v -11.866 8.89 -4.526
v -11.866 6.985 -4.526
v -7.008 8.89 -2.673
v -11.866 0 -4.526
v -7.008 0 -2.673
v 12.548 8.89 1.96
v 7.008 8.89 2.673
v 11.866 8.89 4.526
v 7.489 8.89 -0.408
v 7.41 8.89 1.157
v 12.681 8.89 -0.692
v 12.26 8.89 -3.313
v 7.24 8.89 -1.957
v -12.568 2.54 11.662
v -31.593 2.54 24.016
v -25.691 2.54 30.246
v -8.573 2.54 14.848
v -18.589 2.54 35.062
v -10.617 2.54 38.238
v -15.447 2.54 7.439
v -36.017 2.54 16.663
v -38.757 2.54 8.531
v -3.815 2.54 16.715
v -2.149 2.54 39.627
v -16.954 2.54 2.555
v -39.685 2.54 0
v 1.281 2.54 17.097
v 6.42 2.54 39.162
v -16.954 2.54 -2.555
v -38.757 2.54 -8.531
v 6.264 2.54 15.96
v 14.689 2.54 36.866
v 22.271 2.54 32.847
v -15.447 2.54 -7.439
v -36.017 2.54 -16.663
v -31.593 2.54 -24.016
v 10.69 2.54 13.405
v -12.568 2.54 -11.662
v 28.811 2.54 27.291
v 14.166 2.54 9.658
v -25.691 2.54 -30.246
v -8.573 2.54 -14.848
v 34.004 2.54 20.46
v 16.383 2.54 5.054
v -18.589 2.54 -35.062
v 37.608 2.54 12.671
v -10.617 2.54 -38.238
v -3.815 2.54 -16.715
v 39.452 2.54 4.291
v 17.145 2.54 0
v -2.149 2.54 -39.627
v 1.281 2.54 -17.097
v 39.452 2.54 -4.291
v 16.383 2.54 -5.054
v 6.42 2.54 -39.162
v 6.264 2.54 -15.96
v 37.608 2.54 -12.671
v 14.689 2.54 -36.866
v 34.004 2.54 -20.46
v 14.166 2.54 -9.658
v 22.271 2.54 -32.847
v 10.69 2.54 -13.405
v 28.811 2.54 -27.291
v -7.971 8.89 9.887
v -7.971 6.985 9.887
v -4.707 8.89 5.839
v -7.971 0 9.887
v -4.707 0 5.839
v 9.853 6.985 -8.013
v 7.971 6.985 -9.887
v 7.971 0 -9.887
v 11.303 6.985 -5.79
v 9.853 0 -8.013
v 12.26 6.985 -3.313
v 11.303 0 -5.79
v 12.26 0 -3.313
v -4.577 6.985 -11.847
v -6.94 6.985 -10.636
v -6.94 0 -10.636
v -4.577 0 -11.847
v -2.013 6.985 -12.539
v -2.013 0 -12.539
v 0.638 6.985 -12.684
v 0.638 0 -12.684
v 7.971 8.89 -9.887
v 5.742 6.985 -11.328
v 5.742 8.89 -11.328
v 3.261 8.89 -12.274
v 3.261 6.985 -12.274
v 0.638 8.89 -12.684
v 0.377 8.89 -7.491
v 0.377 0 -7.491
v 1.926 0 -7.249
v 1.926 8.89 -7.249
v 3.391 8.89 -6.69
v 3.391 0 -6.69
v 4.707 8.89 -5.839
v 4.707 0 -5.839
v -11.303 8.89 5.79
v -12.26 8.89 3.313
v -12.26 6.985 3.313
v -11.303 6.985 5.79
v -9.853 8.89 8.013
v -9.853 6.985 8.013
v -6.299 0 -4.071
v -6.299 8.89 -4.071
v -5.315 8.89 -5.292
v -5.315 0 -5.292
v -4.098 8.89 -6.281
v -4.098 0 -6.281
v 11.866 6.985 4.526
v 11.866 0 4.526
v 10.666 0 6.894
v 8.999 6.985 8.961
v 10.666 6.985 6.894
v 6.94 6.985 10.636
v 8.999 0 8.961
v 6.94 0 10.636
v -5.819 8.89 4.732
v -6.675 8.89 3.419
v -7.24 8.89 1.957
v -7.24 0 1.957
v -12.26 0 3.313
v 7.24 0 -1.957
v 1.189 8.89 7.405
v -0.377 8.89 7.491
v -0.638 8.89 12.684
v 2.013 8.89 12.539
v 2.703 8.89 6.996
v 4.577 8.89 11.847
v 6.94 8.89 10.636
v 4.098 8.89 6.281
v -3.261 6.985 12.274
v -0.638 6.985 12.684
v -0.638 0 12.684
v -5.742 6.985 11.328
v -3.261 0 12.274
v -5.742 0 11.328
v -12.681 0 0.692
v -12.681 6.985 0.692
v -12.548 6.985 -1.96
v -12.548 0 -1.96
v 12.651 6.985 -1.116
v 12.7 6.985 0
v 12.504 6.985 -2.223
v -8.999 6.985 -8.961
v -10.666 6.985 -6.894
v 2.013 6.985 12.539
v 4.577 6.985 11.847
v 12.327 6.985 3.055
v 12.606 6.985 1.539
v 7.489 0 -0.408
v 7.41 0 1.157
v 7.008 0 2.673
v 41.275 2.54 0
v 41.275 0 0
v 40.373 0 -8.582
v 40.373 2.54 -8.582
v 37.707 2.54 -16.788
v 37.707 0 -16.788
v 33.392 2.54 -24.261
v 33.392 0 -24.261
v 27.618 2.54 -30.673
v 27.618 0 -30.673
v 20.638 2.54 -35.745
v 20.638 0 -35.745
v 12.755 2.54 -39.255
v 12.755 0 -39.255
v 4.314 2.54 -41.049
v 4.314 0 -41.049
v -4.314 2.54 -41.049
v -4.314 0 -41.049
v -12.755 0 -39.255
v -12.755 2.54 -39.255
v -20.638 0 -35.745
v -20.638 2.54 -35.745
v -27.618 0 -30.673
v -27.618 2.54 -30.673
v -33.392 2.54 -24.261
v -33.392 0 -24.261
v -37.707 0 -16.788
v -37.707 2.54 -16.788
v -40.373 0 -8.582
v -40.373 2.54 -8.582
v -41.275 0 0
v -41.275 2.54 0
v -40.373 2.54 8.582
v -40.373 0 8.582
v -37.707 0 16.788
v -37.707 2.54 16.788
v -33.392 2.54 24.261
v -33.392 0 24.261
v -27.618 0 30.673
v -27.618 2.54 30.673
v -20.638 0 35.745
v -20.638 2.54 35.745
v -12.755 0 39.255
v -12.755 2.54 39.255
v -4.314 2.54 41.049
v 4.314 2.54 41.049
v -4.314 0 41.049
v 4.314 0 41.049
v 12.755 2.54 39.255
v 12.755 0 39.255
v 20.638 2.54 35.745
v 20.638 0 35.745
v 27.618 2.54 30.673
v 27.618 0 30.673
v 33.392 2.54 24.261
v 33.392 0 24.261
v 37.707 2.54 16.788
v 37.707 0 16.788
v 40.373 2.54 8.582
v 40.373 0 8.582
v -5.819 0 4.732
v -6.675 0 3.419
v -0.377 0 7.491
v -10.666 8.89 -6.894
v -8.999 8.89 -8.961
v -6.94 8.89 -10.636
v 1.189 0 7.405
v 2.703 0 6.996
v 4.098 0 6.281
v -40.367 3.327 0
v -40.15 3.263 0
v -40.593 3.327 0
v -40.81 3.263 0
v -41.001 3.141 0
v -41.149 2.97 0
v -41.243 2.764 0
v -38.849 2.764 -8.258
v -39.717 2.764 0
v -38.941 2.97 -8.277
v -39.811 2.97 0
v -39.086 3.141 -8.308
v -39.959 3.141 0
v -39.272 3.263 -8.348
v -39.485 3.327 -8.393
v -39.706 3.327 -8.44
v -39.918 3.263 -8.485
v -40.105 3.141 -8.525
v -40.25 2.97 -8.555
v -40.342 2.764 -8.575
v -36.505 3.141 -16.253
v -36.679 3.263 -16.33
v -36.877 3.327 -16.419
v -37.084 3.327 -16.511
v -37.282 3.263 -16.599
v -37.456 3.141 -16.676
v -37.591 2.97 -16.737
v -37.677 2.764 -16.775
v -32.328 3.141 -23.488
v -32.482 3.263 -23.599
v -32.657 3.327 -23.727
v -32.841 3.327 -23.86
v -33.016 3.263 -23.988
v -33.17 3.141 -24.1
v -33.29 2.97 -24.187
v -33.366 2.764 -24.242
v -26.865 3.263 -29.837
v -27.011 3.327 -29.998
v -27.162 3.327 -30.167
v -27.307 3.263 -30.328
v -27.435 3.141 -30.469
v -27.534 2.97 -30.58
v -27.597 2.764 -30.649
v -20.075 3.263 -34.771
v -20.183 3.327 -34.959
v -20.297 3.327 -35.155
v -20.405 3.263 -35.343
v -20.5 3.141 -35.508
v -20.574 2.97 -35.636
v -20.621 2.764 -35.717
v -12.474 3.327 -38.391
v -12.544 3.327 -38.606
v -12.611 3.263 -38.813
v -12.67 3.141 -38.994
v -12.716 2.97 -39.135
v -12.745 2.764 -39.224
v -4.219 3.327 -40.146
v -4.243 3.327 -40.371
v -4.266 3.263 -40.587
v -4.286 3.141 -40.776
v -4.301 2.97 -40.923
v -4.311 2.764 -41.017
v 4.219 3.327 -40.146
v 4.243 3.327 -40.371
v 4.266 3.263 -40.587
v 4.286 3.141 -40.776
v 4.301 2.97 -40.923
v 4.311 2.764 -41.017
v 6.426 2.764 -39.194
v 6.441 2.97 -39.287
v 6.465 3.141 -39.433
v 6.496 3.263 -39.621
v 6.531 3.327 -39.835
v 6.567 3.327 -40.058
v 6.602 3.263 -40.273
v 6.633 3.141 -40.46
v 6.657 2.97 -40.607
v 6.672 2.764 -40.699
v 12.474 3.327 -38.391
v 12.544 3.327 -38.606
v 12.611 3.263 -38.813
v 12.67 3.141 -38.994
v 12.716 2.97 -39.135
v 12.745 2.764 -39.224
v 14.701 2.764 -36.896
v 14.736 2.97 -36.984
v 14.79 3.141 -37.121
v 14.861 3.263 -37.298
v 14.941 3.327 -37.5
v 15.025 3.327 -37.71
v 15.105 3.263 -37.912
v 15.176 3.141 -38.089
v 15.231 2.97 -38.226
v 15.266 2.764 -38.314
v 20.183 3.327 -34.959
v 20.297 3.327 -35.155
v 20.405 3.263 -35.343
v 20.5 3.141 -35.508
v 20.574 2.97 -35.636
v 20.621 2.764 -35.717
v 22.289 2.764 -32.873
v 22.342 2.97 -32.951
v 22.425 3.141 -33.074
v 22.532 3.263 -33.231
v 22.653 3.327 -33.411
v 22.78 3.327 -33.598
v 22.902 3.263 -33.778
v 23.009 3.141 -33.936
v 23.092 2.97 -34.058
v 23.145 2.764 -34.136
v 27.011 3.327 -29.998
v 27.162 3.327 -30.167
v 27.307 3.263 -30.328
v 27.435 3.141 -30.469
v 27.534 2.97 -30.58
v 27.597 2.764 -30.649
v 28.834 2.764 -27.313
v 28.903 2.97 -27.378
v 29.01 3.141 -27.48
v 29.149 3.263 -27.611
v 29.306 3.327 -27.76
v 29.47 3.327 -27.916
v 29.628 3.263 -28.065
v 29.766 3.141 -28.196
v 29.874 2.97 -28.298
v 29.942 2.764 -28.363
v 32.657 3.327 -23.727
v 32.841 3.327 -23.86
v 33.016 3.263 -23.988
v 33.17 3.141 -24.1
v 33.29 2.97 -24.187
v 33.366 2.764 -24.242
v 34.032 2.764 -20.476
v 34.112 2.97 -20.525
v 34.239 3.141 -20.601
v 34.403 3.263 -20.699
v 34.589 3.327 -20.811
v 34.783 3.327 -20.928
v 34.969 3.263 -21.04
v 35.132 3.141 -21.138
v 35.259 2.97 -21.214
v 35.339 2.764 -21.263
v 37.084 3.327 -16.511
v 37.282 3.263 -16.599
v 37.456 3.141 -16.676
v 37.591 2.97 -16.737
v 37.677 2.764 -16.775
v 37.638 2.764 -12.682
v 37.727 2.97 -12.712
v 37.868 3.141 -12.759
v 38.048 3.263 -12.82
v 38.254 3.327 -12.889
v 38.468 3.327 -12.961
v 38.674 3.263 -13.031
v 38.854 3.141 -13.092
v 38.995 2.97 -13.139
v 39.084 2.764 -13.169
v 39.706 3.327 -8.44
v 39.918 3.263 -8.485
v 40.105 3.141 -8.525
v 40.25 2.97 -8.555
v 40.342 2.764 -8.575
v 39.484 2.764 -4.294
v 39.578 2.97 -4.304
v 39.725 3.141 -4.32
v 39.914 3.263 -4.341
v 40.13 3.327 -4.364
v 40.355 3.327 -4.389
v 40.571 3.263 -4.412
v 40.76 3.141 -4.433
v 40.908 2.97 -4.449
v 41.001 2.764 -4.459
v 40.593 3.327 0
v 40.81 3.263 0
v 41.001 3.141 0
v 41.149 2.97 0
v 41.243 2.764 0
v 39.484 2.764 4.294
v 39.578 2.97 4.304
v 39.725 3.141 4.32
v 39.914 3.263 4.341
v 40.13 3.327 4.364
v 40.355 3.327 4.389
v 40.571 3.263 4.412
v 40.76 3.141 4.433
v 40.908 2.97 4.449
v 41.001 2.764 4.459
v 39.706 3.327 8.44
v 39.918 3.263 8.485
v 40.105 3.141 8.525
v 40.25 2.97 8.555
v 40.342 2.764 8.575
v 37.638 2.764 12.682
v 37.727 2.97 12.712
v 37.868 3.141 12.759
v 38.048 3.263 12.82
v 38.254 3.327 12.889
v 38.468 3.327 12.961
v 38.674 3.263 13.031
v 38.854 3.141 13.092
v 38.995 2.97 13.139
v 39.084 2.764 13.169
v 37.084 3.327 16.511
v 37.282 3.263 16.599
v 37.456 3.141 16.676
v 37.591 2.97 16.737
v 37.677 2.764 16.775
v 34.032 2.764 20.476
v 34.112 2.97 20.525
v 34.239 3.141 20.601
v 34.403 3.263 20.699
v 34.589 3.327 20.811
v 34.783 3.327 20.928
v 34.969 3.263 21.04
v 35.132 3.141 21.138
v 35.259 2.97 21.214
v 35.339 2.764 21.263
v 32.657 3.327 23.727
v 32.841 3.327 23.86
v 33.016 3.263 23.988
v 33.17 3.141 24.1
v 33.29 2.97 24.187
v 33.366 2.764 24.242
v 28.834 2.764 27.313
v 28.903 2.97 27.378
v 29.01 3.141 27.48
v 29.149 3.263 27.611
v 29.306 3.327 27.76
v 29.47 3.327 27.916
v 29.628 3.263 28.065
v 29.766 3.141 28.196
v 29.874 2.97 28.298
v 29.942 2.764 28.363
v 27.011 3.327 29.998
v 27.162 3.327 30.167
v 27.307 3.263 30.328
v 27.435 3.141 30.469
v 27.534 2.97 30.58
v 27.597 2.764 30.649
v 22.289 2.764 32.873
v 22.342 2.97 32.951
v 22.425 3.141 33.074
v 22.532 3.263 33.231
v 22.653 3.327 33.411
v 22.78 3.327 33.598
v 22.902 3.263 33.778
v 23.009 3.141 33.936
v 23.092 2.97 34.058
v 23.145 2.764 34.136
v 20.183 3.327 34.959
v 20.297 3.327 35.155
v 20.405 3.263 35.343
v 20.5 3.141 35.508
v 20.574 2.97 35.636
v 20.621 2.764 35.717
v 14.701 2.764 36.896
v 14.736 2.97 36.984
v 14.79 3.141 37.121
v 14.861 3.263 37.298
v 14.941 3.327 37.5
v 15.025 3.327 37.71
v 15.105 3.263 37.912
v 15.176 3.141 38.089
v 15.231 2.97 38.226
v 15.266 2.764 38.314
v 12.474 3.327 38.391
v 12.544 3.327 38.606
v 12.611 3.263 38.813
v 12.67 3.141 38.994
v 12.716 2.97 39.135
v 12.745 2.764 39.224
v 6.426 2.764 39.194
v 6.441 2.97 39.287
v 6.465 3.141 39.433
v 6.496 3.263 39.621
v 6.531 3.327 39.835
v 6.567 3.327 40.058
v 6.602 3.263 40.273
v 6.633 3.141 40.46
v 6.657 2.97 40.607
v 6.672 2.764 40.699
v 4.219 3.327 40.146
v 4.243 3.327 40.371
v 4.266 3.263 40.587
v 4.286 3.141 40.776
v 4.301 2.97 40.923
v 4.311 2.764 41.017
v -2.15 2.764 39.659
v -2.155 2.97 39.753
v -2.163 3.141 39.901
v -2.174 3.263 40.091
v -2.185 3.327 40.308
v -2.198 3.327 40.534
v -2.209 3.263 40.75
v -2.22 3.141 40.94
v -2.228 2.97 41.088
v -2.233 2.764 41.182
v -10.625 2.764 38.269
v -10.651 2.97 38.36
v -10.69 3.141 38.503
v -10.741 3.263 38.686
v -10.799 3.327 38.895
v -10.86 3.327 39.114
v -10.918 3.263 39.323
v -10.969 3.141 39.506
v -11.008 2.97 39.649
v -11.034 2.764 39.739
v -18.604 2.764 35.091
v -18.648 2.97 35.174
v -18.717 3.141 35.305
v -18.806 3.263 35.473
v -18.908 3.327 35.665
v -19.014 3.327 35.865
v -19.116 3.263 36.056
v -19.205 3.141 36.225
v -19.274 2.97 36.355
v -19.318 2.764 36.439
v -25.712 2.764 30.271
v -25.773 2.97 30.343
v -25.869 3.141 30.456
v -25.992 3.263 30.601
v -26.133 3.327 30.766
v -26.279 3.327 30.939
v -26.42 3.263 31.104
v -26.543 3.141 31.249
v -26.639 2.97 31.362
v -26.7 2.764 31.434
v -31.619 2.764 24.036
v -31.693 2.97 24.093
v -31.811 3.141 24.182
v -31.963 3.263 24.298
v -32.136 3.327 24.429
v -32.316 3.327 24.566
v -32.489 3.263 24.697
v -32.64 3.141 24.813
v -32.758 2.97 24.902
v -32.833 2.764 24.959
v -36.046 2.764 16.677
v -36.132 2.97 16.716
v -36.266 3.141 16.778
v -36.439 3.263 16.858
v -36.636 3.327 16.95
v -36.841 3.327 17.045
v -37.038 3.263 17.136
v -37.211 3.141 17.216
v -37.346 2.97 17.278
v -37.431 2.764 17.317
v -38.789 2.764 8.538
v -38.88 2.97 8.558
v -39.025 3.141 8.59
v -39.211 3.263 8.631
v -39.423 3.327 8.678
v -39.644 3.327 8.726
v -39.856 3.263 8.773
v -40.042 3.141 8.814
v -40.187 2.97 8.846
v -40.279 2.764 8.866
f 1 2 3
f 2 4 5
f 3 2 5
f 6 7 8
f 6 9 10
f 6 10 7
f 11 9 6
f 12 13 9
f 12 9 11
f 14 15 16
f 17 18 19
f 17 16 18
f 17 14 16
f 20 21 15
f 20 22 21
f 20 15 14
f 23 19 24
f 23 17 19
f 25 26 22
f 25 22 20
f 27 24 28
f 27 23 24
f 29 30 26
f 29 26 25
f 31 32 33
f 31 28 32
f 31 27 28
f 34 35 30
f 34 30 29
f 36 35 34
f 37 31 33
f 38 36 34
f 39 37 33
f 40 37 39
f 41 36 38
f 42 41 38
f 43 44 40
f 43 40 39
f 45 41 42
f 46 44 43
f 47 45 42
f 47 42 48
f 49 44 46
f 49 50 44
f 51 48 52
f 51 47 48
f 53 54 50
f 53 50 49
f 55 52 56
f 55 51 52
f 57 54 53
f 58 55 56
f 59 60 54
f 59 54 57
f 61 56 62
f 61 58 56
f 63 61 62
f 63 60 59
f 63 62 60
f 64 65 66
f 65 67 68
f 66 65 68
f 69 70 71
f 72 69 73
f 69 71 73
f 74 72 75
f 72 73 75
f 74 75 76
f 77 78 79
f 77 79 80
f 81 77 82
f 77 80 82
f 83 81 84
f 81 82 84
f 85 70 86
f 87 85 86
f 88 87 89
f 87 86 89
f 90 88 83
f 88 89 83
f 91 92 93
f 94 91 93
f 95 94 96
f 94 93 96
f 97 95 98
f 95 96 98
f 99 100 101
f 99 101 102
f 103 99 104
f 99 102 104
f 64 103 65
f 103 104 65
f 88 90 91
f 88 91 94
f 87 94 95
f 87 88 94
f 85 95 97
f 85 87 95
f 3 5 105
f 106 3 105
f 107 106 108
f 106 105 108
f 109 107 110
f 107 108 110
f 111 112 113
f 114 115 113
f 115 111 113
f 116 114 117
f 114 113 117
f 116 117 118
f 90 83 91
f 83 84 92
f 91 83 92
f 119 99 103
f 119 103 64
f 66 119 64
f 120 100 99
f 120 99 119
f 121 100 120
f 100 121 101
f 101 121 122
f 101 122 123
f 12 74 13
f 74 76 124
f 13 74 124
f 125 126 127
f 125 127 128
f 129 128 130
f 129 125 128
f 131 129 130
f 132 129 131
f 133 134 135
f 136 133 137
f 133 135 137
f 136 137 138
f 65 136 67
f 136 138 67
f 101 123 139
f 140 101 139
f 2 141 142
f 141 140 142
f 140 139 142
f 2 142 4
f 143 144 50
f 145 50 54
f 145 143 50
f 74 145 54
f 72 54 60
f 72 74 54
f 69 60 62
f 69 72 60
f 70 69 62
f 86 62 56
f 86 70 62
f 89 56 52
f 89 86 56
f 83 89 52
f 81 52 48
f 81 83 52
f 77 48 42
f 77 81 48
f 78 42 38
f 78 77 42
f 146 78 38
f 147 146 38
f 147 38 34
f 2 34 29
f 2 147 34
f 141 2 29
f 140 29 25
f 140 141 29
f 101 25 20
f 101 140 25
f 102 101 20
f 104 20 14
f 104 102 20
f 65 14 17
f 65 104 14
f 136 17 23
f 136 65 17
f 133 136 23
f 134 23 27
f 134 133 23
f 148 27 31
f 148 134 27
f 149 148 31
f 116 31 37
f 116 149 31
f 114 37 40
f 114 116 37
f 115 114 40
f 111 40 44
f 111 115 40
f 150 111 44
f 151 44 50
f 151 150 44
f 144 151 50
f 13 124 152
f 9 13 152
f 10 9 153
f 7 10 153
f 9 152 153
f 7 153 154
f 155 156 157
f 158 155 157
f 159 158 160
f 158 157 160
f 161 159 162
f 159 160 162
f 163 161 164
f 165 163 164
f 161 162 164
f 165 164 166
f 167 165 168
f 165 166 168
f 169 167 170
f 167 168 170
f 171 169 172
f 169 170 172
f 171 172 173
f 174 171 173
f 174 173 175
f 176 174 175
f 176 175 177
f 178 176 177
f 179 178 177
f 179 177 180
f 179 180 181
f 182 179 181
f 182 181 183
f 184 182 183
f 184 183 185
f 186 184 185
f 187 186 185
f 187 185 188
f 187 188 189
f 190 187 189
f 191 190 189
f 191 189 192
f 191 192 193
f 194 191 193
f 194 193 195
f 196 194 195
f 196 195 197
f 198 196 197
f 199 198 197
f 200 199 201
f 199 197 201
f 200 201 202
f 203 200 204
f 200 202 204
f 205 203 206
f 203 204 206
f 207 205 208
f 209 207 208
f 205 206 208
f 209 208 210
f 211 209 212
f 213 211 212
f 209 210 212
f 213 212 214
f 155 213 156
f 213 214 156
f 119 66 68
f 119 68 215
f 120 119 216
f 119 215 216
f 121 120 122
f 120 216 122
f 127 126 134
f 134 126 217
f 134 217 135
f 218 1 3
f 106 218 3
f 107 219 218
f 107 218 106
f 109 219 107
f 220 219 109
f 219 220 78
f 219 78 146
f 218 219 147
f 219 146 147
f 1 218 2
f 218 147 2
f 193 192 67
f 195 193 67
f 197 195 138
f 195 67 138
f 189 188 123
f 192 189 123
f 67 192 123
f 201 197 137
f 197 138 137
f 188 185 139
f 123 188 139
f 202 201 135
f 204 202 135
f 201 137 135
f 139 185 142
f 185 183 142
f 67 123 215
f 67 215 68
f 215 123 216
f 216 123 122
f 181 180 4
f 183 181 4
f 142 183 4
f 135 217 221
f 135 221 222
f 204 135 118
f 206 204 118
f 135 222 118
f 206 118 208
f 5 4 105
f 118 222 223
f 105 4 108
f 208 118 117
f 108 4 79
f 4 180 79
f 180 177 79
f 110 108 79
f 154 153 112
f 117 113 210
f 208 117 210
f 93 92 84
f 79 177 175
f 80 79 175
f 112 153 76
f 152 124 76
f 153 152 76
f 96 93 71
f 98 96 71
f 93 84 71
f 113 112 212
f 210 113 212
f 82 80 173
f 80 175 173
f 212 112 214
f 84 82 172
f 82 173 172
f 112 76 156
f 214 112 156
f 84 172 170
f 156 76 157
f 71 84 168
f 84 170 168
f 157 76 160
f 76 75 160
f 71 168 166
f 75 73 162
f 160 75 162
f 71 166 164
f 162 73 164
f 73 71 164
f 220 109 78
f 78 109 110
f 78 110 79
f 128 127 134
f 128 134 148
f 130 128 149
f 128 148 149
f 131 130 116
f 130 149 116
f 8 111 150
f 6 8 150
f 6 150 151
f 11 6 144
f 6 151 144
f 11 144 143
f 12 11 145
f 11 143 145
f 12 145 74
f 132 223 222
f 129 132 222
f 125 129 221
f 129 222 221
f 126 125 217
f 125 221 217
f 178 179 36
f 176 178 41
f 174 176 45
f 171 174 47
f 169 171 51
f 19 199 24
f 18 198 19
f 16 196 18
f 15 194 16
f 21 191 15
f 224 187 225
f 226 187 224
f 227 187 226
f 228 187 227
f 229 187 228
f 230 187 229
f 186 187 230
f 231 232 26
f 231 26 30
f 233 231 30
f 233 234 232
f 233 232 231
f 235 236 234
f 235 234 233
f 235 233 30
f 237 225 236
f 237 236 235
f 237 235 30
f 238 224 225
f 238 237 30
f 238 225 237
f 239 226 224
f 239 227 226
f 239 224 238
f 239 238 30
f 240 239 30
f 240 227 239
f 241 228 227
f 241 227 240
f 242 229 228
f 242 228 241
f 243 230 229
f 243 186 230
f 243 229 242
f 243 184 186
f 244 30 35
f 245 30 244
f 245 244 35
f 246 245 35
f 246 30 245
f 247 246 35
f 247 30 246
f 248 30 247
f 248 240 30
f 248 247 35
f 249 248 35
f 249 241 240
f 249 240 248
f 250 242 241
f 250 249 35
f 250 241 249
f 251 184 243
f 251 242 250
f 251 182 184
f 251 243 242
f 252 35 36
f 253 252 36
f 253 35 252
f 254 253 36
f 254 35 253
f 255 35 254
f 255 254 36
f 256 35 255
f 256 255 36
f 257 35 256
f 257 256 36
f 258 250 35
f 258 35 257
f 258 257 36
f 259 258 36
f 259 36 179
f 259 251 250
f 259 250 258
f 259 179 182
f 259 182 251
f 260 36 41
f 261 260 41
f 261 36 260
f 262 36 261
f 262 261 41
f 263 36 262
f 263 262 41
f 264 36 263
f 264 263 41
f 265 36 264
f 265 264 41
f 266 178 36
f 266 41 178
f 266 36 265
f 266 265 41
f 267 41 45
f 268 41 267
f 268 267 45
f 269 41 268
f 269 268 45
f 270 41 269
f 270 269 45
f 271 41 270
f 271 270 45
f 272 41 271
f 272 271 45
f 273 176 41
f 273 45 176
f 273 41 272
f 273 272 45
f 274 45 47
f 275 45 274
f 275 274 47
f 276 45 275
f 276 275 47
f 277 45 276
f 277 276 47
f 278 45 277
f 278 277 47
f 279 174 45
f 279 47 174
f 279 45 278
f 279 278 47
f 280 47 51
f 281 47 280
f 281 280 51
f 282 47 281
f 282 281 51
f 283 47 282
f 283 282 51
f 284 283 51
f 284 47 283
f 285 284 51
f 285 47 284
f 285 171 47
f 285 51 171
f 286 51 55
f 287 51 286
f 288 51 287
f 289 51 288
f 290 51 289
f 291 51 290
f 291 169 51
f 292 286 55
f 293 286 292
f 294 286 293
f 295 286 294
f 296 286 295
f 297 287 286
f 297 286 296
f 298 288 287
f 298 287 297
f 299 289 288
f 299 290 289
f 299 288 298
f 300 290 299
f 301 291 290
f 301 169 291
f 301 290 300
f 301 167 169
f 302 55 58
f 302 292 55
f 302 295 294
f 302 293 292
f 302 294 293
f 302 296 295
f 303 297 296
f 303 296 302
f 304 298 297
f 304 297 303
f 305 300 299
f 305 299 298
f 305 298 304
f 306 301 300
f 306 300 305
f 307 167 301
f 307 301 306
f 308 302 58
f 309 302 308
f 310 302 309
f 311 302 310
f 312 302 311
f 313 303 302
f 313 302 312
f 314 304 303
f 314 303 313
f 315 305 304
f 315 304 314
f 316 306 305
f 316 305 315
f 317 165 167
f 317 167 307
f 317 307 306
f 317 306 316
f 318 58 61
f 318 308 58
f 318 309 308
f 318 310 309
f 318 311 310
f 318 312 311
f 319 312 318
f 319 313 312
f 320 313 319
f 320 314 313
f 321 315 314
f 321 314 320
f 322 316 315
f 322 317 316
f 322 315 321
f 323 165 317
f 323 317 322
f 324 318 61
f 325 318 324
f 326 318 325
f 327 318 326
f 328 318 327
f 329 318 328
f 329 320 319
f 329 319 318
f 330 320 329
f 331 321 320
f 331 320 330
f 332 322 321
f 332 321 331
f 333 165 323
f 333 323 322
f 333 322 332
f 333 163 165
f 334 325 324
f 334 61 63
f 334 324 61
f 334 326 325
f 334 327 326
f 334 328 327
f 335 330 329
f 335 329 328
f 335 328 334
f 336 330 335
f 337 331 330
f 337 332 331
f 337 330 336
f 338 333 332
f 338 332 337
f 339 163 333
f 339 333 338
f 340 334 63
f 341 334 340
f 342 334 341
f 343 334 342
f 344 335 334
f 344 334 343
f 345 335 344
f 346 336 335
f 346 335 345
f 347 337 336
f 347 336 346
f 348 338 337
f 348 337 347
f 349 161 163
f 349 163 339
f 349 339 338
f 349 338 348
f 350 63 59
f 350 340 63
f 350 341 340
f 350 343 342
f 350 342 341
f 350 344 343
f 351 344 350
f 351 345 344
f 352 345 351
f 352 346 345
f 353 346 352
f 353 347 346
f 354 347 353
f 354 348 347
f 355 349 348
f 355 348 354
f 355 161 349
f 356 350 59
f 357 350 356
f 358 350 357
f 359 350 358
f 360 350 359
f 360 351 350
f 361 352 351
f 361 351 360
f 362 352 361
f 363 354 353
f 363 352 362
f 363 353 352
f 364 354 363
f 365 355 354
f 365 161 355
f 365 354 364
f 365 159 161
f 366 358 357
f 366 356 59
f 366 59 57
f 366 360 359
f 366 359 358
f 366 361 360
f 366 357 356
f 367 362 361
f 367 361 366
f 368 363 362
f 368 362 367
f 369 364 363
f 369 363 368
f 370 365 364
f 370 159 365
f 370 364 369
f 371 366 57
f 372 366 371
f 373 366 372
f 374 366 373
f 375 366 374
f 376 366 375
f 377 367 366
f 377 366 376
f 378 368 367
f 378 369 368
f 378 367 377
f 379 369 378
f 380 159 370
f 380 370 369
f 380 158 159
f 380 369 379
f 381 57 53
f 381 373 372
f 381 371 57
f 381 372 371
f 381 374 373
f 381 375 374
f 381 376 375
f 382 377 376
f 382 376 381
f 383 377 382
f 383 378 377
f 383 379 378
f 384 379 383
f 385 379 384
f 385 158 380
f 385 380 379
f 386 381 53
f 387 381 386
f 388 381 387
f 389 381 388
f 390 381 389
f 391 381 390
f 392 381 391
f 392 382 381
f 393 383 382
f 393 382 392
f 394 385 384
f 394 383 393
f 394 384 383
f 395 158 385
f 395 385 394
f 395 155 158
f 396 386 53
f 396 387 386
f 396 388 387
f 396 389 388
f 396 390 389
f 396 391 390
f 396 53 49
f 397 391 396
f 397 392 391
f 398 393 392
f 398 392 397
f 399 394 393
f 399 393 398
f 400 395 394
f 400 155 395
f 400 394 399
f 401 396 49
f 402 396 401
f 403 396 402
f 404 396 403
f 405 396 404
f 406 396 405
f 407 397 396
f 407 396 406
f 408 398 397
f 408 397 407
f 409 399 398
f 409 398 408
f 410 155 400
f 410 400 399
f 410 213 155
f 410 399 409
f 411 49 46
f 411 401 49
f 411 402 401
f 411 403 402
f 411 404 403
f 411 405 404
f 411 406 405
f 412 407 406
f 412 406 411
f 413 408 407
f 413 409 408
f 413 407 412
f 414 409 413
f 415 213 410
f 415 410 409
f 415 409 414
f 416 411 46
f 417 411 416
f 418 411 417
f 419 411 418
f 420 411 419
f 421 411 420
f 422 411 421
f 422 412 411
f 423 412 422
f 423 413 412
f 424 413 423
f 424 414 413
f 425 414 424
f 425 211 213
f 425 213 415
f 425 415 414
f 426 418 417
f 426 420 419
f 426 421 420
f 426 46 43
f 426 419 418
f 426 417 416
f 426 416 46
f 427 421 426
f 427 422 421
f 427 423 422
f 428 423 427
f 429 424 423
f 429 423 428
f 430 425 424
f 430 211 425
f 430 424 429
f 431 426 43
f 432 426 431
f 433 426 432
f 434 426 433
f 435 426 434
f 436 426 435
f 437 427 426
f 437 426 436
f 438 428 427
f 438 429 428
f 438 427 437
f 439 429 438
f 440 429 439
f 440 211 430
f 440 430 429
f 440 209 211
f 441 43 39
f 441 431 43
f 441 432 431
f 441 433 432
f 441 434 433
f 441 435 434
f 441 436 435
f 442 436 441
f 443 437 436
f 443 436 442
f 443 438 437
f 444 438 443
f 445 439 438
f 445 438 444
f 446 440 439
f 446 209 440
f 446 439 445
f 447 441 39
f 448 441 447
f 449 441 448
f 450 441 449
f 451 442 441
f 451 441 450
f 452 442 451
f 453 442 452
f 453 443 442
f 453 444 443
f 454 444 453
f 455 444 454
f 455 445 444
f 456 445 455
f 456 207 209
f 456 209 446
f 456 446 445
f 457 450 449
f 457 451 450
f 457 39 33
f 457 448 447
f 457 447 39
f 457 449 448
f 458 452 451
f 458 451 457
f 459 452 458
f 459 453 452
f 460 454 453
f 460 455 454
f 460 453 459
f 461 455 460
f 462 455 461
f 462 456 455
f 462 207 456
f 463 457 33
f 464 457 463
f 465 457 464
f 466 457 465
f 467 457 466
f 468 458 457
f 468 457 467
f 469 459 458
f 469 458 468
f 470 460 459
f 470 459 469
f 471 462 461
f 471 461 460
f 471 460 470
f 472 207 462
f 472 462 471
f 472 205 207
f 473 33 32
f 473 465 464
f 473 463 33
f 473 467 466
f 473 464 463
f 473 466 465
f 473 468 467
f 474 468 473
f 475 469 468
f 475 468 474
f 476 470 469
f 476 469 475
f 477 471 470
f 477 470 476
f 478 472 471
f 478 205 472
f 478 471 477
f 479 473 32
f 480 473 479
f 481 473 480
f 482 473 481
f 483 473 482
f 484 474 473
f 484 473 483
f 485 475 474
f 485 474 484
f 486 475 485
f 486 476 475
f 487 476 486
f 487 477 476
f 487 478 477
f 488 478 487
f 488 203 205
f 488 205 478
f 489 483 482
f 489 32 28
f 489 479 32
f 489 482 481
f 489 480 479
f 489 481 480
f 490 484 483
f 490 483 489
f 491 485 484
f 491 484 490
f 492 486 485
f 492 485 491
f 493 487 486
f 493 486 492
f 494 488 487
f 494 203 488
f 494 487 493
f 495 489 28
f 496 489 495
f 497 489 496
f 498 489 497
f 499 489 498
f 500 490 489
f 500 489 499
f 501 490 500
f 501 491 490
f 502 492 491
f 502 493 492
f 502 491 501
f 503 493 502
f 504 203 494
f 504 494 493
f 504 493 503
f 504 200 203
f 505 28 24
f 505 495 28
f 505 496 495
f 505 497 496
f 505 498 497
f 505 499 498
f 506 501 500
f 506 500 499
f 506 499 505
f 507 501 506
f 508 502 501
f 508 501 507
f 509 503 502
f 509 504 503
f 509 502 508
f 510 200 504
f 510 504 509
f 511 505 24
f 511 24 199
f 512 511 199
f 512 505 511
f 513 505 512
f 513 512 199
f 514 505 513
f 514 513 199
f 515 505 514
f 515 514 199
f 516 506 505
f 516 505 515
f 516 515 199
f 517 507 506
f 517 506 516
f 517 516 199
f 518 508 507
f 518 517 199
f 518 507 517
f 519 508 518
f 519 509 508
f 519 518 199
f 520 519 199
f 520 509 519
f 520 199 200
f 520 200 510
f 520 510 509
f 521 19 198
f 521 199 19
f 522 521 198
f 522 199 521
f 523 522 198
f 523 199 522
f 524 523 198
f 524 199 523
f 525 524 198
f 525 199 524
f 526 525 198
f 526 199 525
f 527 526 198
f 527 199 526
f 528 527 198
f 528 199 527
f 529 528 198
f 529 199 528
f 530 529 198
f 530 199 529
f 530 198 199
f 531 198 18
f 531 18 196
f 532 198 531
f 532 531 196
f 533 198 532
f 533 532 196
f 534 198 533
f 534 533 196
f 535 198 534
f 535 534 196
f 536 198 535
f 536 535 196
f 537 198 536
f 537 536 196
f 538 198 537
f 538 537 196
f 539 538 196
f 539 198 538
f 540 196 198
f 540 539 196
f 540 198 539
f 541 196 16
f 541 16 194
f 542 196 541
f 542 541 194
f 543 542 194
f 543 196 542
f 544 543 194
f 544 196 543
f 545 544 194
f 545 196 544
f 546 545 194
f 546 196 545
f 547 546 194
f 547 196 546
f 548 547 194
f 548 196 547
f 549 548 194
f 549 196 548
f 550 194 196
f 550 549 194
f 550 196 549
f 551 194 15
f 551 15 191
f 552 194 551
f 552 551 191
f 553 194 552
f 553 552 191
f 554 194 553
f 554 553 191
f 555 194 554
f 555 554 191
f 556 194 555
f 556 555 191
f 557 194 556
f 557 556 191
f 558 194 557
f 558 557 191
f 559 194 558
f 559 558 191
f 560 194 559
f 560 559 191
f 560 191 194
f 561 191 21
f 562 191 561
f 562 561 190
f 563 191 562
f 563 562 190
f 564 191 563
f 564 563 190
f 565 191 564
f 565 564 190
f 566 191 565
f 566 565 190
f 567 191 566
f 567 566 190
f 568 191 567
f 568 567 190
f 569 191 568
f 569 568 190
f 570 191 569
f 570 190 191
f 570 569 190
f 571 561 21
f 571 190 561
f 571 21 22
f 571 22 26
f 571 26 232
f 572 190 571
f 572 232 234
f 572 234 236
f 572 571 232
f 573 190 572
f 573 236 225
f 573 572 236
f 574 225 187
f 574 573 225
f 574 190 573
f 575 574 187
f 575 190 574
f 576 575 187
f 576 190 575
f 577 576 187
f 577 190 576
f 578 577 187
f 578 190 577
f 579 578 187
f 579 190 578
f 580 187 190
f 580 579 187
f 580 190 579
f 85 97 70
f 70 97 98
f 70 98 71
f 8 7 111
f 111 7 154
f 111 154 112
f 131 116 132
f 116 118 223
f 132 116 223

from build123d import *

# Parameters (mm, degrees)
SKETCH1_R           = 41.275
BOSS_EXTRUDE1_DEPTH = 2.54
SKETCH6_R           = 12.7
BOSS_EXTRUDE3_DEPTH = 6.35
CHAMFER2_SIZE       = 4.445
CUT_EXTRUDE2_DEPTH  = 9.89


with BuildPart() as part:
    # Sketch1 → Boss-Extrude1 (new body)
    with BuildSketch(Plane(origin=(0, 0, 0), x_dir=(1, 0, 0), z_dir=(0, 1, 0))):
        Circle(SKETCH1_R)
    extrude(amount=BOSS_EXTRUDE1_DEPTH)

    # Sketch6 → Boss-Extrude3 (add)
    with BuildSketch(Plane(origin=(0, 2.54, 0), x_dir=(1, 0, 0), z_dir=(0, 1, 0))):
        Circle(SKETCH6_R)
    extrude(amount=BOSS_EXTRUDE3_DEPTH)

    # Chamfer2
    chamfer2_edges = [part.edges().sort_by_distance(p)[0] for p in [
        (-12.7, 2.54, 0),
    ]]
    chamfer(chamfer2_edges, length=CHAMFER2_SIZE)

    # Sketch4 → Cut-Extrude2 (cut, through all)
    with BuildSketch(Plane.XZ):
        with BuildLine():
            ThreePointArc((11.86615569, 4.52596389), (9.886784934, 7.971291217), (6.939626784, 10.636333019))
            Line((6.939626784, 10.636333019), (4.098204794, 6.281299027))
            ThreePointArc((4.098204794, 6.281299027), (1.956596228, 7.240285298), (-0.376537609, 7.490541998))
            Line((-0.376537609, 7.490541998), (-0.637603684, 12.683984451))
            ThreePointArc((-0.637603684, 12.683984451), (-4.52596389, 11.86615569), (-7.971291217, 9.886784934))
            Line((-7.971291217, 9.886784934), (-4.707455443, 5.83865252))
            ThreePointArc((-4.707455443, 5.83865252), (-6.281299027, 4.098204794), (-7.240285298, 1.956596228))
            Line((-7.240285298, 1.956596228), (-12.260216438, 3.313169613))
            ThreePointArc((-12.260216438, 3.313169613), (-12.683984451, -0.637603684), (-11.86615569, -4.52596389))
            Line((-11.86615569, -4.52596389), (-7.007572258, -2.672813321))
            ThreePointArc((-7.007572258, -2.672813321), (-5.83865252, -4.707455443), (-4.098204794, -6.281299027))
            Line((-4.098204794, -6.281299027), (-6.939626784, -10.636333019))
            ThreePointArc((-6.939626784, -10.636333019), (-3.313169613, -12.260216438), (0.637603684, -12.683984451))
            Line((0.637603684, -12.683984451), (0.376537609, -7.490541998))
            ThreePointArc((0.376537609, -7.490541998), (2.672813321, -7.007572258), (4.707455443, -5.83865252))
            Line((4.707455443, -5.83865252), (7.971291217, -9.886784934))
            ThreePointArc((7.971291217, -9.886784934), (10.636333019, -6.939626784), (12.260216438, -3.313169613))
            Line((12.260216438, -3.313169613), (7.240285298, -1.956596228))
            ThreePointArc((7.240285298, -1.956596228), (7.490541998, 0.376537609), (7.007572258, 2.672813321))
            Line((7.007572258, 2.672813321), (11.86615569, 4.52596389))
        make_face()
    extrude(amount=-CUT_EXTRUDE2_DEPTH, mode=Mode.SUBTRACT)

    # Sketch7 → Revolve1 (revolve)
    with BuildSketch(Plane.XY):
        with BuildLine():
            Line((-41.275, 2.54), (-39.68496, 2.54))
            ThreePointArc((-39.68496, 2.54), (-40.47998, 3.33502), (-41.275, 2.54))
        make_face()
    revolve(axis=Axis((0, 8.001, 0), (0, -1, 0)))


solid = part.part
